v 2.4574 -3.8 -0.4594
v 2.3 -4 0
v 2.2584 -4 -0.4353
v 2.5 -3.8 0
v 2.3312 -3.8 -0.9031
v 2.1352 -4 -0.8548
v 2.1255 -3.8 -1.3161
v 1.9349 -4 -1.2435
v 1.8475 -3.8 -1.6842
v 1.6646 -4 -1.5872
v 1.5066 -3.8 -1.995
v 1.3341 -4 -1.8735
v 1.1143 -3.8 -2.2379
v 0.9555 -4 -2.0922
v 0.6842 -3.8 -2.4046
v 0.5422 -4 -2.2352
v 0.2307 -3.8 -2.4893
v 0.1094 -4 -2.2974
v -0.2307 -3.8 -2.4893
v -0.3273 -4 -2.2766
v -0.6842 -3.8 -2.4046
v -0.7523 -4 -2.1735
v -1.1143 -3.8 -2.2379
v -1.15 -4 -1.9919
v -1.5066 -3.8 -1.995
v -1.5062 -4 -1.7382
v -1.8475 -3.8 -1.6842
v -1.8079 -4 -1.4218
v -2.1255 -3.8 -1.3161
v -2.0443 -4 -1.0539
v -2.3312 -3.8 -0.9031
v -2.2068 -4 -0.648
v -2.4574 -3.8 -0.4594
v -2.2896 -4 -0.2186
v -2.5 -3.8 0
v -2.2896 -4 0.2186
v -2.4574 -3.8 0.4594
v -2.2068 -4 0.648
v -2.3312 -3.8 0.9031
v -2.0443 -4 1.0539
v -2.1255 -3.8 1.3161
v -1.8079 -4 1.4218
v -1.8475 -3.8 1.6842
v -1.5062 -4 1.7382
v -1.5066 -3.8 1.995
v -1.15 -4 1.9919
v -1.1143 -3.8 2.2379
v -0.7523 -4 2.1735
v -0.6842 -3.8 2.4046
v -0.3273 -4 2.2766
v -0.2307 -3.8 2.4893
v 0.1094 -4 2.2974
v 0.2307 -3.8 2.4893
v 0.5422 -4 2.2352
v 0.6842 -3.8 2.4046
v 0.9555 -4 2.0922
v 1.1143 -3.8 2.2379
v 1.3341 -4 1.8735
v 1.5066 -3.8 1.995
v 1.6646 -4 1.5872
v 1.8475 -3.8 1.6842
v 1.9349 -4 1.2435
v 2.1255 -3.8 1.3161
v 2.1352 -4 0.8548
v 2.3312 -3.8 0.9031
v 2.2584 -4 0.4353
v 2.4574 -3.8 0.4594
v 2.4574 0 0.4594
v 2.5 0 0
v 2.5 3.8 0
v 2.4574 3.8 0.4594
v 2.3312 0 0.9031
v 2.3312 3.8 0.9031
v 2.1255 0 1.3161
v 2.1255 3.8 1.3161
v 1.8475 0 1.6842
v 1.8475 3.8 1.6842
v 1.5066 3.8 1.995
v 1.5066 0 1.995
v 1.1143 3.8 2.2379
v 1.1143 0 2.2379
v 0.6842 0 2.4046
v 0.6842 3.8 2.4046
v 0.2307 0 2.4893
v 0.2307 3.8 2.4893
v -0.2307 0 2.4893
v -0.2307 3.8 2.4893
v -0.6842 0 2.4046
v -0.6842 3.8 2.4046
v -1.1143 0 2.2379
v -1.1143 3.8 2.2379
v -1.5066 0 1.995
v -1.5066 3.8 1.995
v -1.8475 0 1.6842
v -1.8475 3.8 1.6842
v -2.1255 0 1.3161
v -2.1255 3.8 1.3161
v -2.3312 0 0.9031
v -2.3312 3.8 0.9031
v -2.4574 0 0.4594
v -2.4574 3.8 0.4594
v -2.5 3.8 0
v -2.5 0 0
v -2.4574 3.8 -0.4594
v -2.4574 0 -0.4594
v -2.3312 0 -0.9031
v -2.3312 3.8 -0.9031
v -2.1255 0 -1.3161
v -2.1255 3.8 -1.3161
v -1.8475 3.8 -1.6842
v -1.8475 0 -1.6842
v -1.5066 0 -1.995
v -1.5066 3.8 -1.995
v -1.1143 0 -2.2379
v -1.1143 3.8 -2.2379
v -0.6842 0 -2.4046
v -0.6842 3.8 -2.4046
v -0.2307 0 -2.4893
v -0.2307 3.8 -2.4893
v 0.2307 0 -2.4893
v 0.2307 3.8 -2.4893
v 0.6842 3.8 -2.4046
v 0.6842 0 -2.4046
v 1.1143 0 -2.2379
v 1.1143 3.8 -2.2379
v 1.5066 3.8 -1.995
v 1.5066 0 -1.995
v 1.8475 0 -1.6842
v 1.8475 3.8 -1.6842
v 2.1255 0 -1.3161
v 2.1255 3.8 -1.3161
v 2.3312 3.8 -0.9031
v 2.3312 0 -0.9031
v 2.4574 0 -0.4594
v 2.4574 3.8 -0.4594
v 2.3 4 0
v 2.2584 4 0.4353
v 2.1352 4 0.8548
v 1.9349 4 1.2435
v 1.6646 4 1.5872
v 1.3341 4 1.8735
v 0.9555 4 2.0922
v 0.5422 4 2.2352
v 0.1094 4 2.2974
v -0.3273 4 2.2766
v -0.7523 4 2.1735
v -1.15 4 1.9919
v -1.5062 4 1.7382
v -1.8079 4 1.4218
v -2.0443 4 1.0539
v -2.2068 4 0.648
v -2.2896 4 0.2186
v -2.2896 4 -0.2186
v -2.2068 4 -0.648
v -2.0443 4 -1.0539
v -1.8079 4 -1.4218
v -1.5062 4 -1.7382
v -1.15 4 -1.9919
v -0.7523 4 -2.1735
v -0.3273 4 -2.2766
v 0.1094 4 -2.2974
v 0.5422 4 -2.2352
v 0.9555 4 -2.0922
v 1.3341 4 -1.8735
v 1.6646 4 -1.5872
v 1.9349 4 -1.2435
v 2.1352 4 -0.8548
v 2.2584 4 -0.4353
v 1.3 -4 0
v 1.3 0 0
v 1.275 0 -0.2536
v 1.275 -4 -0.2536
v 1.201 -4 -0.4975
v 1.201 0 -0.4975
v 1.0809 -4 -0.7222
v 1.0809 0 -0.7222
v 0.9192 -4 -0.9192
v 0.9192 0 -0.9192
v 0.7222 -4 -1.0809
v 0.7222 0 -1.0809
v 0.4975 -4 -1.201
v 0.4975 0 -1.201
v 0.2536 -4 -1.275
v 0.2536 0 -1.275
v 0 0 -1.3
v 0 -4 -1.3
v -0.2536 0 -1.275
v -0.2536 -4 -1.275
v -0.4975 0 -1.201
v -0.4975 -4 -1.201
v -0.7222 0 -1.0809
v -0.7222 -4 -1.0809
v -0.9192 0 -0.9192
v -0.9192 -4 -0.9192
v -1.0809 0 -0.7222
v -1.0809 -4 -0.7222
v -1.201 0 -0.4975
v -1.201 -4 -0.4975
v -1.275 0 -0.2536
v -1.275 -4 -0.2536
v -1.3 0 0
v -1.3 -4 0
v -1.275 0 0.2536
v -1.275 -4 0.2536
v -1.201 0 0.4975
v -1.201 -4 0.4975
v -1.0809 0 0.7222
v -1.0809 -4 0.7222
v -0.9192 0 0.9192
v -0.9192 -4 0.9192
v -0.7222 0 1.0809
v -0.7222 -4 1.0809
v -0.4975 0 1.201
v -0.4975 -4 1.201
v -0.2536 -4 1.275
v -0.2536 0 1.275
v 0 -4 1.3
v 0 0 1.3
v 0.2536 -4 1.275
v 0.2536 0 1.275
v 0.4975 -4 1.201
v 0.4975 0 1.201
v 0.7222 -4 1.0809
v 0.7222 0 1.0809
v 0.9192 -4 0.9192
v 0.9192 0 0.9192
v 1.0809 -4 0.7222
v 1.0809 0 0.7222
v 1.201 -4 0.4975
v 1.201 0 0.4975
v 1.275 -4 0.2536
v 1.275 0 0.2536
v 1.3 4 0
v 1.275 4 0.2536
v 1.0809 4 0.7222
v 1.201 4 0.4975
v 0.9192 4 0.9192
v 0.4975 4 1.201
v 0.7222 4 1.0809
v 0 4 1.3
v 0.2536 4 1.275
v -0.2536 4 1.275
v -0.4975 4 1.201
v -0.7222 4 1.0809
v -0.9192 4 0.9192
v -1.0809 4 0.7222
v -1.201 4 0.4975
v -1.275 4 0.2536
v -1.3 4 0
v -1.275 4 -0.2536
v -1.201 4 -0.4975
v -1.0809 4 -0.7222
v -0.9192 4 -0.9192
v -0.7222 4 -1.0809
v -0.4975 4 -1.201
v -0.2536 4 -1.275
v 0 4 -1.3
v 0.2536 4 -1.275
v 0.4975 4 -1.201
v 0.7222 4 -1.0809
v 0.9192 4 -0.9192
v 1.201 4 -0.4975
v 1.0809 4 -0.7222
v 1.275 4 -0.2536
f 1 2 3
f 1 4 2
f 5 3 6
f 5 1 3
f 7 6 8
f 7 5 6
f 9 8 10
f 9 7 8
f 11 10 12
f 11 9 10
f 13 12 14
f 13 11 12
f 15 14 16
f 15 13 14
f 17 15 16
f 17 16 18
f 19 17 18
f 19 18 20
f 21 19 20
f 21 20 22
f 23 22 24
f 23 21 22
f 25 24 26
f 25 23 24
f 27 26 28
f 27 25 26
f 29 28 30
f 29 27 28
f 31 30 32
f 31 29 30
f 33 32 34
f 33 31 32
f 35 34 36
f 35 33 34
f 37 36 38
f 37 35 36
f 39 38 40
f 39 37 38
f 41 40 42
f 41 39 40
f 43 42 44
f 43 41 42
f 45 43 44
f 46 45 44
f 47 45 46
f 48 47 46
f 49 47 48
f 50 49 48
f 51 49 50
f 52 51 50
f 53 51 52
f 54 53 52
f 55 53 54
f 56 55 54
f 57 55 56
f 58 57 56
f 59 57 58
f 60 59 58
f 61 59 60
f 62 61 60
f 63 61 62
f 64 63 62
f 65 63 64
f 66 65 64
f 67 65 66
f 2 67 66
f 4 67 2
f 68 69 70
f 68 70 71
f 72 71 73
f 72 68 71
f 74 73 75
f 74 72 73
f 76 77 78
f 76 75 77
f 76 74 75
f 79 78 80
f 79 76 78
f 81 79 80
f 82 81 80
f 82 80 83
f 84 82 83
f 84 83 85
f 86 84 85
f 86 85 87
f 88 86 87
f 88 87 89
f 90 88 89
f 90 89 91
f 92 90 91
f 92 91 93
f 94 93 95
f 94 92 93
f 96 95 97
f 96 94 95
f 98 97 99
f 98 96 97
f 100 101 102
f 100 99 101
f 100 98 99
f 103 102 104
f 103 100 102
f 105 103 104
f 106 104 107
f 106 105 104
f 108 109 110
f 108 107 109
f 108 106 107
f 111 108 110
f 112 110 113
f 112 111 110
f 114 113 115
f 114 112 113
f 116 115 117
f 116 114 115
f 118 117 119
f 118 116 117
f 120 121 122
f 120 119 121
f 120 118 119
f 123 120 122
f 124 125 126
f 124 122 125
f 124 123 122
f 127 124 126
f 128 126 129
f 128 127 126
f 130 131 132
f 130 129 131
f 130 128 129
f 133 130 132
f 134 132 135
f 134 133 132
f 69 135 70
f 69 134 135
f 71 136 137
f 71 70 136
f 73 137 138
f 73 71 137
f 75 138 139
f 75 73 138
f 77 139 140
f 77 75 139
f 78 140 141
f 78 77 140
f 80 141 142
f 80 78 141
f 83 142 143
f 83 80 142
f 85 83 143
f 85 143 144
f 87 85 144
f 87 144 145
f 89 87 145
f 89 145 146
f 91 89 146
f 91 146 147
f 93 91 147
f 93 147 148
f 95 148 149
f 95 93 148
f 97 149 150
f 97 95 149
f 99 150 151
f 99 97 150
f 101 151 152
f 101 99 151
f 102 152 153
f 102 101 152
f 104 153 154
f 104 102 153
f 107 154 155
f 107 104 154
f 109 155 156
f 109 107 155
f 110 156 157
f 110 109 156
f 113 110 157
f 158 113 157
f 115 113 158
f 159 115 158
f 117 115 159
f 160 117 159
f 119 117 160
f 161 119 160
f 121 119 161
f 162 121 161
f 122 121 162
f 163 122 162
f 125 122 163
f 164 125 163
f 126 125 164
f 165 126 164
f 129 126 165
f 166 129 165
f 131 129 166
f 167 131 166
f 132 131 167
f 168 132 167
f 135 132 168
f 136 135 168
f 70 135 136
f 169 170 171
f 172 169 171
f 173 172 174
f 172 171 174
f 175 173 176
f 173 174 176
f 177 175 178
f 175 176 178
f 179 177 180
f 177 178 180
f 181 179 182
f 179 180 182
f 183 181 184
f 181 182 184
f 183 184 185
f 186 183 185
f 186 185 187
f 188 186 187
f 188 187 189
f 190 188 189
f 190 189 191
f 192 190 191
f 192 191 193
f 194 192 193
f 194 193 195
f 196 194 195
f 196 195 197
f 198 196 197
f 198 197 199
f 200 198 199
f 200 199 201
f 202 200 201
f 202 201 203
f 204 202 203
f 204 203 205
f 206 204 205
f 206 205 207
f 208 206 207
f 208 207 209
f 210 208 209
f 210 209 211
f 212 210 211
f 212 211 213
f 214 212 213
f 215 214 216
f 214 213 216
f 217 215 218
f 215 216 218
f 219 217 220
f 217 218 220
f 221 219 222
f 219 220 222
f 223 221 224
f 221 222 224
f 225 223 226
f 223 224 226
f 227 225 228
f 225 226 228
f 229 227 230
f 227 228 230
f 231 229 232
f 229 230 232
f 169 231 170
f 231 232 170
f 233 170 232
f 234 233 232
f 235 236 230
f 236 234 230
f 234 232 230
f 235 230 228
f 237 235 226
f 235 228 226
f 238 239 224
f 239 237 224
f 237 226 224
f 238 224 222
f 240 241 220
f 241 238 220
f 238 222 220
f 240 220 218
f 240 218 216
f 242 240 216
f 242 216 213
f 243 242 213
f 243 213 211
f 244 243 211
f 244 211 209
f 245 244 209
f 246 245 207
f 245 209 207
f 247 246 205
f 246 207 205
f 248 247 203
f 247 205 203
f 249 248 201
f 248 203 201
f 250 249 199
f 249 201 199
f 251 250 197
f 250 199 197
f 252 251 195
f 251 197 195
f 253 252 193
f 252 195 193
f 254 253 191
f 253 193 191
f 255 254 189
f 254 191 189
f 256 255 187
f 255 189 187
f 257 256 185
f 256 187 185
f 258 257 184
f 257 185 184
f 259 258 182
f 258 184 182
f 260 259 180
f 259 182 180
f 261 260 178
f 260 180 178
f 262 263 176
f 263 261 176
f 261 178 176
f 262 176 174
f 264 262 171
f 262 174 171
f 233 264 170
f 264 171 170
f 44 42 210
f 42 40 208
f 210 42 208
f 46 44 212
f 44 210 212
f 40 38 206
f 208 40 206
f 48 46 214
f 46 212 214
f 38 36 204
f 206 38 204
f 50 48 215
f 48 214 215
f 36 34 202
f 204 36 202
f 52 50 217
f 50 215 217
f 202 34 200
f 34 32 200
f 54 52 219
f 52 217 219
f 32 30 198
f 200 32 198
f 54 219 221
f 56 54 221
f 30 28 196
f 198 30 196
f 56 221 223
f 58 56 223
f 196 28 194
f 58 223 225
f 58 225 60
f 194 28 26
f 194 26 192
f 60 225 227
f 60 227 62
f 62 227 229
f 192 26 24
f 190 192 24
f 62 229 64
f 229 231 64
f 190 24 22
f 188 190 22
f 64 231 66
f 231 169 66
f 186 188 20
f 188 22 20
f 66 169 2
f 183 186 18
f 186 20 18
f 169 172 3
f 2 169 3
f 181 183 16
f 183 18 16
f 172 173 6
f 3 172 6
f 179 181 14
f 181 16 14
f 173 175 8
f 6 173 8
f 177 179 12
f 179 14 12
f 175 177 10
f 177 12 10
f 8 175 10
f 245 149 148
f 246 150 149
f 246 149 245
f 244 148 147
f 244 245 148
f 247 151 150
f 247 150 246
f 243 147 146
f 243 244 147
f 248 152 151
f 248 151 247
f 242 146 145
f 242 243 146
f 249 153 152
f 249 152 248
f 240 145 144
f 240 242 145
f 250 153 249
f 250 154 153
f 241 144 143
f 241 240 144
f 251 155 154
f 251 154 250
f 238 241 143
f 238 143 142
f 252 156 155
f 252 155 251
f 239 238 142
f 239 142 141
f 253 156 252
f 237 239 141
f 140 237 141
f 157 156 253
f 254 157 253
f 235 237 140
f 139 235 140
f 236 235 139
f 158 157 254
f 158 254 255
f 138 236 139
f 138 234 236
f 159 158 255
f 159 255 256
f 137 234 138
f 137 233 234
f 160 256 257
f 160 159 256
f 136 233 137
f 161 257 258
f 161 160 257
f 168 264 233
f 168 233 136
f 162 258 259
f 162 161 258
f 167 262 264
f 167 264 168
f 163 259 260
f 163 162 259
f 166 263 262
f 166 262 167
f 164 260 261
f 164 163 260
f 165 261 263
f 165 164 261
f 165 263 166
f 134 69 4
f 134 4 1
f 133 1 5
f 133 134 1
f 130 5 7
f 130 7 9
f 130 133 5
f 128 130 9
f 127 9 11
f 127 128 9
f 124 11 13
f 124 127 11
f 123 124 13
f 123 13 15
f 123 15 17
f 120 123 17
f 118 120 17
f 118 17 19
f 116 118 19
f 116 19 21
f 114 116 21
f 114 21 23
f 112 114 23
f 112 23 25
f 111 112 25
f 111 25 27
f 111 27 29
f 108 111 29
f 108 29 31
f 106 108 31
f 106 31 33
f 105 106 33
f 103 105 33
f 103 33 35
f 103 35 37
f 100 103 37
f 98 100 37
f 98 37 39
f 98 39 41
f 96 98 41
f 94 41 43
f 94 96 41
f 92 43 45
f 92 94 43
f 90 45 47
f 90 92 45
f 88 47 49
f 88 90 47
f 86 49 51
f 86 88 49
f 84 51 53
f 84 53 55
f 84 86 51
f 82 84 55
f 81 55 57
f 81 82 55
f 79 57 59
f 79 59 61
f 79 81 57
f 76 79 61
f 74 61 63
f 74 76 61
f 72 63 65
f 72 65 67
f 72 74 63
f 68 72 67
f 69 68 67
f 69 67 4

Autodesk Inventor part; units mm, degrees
ref_plane "YZ Plane" through (0, 0, 0) normal (1, 0, 0) x (0, 1, 0)
ref_plane "XZ Plane" through (0, 0, 0) normal (0, 1, 0) x (-1, 0, 0)
ref_plane "XY Plane" through (0, 0, 0) normal (0, 0, 1) x (1, 0, 0)
sketch "スケッチ1" plane through (0, 0, 0) normal (0, 1, 0) x (1, 0, 0)
  circle A0 centre (0, 0) radius 2.5
  circle A1 centre (0, 0) radius 1.3
  dimension "d0" = 5
  dimension "d1" = 2.6
extrude "押し出し1" add sketch "スケッチ1" along normal mid plane 8
chamfer "面取り1" distance 0.2 angle 45 2 edges at (-2.5, 4, 0) (-2.5, -4, 0)
properties part number "ARL-2608E"
